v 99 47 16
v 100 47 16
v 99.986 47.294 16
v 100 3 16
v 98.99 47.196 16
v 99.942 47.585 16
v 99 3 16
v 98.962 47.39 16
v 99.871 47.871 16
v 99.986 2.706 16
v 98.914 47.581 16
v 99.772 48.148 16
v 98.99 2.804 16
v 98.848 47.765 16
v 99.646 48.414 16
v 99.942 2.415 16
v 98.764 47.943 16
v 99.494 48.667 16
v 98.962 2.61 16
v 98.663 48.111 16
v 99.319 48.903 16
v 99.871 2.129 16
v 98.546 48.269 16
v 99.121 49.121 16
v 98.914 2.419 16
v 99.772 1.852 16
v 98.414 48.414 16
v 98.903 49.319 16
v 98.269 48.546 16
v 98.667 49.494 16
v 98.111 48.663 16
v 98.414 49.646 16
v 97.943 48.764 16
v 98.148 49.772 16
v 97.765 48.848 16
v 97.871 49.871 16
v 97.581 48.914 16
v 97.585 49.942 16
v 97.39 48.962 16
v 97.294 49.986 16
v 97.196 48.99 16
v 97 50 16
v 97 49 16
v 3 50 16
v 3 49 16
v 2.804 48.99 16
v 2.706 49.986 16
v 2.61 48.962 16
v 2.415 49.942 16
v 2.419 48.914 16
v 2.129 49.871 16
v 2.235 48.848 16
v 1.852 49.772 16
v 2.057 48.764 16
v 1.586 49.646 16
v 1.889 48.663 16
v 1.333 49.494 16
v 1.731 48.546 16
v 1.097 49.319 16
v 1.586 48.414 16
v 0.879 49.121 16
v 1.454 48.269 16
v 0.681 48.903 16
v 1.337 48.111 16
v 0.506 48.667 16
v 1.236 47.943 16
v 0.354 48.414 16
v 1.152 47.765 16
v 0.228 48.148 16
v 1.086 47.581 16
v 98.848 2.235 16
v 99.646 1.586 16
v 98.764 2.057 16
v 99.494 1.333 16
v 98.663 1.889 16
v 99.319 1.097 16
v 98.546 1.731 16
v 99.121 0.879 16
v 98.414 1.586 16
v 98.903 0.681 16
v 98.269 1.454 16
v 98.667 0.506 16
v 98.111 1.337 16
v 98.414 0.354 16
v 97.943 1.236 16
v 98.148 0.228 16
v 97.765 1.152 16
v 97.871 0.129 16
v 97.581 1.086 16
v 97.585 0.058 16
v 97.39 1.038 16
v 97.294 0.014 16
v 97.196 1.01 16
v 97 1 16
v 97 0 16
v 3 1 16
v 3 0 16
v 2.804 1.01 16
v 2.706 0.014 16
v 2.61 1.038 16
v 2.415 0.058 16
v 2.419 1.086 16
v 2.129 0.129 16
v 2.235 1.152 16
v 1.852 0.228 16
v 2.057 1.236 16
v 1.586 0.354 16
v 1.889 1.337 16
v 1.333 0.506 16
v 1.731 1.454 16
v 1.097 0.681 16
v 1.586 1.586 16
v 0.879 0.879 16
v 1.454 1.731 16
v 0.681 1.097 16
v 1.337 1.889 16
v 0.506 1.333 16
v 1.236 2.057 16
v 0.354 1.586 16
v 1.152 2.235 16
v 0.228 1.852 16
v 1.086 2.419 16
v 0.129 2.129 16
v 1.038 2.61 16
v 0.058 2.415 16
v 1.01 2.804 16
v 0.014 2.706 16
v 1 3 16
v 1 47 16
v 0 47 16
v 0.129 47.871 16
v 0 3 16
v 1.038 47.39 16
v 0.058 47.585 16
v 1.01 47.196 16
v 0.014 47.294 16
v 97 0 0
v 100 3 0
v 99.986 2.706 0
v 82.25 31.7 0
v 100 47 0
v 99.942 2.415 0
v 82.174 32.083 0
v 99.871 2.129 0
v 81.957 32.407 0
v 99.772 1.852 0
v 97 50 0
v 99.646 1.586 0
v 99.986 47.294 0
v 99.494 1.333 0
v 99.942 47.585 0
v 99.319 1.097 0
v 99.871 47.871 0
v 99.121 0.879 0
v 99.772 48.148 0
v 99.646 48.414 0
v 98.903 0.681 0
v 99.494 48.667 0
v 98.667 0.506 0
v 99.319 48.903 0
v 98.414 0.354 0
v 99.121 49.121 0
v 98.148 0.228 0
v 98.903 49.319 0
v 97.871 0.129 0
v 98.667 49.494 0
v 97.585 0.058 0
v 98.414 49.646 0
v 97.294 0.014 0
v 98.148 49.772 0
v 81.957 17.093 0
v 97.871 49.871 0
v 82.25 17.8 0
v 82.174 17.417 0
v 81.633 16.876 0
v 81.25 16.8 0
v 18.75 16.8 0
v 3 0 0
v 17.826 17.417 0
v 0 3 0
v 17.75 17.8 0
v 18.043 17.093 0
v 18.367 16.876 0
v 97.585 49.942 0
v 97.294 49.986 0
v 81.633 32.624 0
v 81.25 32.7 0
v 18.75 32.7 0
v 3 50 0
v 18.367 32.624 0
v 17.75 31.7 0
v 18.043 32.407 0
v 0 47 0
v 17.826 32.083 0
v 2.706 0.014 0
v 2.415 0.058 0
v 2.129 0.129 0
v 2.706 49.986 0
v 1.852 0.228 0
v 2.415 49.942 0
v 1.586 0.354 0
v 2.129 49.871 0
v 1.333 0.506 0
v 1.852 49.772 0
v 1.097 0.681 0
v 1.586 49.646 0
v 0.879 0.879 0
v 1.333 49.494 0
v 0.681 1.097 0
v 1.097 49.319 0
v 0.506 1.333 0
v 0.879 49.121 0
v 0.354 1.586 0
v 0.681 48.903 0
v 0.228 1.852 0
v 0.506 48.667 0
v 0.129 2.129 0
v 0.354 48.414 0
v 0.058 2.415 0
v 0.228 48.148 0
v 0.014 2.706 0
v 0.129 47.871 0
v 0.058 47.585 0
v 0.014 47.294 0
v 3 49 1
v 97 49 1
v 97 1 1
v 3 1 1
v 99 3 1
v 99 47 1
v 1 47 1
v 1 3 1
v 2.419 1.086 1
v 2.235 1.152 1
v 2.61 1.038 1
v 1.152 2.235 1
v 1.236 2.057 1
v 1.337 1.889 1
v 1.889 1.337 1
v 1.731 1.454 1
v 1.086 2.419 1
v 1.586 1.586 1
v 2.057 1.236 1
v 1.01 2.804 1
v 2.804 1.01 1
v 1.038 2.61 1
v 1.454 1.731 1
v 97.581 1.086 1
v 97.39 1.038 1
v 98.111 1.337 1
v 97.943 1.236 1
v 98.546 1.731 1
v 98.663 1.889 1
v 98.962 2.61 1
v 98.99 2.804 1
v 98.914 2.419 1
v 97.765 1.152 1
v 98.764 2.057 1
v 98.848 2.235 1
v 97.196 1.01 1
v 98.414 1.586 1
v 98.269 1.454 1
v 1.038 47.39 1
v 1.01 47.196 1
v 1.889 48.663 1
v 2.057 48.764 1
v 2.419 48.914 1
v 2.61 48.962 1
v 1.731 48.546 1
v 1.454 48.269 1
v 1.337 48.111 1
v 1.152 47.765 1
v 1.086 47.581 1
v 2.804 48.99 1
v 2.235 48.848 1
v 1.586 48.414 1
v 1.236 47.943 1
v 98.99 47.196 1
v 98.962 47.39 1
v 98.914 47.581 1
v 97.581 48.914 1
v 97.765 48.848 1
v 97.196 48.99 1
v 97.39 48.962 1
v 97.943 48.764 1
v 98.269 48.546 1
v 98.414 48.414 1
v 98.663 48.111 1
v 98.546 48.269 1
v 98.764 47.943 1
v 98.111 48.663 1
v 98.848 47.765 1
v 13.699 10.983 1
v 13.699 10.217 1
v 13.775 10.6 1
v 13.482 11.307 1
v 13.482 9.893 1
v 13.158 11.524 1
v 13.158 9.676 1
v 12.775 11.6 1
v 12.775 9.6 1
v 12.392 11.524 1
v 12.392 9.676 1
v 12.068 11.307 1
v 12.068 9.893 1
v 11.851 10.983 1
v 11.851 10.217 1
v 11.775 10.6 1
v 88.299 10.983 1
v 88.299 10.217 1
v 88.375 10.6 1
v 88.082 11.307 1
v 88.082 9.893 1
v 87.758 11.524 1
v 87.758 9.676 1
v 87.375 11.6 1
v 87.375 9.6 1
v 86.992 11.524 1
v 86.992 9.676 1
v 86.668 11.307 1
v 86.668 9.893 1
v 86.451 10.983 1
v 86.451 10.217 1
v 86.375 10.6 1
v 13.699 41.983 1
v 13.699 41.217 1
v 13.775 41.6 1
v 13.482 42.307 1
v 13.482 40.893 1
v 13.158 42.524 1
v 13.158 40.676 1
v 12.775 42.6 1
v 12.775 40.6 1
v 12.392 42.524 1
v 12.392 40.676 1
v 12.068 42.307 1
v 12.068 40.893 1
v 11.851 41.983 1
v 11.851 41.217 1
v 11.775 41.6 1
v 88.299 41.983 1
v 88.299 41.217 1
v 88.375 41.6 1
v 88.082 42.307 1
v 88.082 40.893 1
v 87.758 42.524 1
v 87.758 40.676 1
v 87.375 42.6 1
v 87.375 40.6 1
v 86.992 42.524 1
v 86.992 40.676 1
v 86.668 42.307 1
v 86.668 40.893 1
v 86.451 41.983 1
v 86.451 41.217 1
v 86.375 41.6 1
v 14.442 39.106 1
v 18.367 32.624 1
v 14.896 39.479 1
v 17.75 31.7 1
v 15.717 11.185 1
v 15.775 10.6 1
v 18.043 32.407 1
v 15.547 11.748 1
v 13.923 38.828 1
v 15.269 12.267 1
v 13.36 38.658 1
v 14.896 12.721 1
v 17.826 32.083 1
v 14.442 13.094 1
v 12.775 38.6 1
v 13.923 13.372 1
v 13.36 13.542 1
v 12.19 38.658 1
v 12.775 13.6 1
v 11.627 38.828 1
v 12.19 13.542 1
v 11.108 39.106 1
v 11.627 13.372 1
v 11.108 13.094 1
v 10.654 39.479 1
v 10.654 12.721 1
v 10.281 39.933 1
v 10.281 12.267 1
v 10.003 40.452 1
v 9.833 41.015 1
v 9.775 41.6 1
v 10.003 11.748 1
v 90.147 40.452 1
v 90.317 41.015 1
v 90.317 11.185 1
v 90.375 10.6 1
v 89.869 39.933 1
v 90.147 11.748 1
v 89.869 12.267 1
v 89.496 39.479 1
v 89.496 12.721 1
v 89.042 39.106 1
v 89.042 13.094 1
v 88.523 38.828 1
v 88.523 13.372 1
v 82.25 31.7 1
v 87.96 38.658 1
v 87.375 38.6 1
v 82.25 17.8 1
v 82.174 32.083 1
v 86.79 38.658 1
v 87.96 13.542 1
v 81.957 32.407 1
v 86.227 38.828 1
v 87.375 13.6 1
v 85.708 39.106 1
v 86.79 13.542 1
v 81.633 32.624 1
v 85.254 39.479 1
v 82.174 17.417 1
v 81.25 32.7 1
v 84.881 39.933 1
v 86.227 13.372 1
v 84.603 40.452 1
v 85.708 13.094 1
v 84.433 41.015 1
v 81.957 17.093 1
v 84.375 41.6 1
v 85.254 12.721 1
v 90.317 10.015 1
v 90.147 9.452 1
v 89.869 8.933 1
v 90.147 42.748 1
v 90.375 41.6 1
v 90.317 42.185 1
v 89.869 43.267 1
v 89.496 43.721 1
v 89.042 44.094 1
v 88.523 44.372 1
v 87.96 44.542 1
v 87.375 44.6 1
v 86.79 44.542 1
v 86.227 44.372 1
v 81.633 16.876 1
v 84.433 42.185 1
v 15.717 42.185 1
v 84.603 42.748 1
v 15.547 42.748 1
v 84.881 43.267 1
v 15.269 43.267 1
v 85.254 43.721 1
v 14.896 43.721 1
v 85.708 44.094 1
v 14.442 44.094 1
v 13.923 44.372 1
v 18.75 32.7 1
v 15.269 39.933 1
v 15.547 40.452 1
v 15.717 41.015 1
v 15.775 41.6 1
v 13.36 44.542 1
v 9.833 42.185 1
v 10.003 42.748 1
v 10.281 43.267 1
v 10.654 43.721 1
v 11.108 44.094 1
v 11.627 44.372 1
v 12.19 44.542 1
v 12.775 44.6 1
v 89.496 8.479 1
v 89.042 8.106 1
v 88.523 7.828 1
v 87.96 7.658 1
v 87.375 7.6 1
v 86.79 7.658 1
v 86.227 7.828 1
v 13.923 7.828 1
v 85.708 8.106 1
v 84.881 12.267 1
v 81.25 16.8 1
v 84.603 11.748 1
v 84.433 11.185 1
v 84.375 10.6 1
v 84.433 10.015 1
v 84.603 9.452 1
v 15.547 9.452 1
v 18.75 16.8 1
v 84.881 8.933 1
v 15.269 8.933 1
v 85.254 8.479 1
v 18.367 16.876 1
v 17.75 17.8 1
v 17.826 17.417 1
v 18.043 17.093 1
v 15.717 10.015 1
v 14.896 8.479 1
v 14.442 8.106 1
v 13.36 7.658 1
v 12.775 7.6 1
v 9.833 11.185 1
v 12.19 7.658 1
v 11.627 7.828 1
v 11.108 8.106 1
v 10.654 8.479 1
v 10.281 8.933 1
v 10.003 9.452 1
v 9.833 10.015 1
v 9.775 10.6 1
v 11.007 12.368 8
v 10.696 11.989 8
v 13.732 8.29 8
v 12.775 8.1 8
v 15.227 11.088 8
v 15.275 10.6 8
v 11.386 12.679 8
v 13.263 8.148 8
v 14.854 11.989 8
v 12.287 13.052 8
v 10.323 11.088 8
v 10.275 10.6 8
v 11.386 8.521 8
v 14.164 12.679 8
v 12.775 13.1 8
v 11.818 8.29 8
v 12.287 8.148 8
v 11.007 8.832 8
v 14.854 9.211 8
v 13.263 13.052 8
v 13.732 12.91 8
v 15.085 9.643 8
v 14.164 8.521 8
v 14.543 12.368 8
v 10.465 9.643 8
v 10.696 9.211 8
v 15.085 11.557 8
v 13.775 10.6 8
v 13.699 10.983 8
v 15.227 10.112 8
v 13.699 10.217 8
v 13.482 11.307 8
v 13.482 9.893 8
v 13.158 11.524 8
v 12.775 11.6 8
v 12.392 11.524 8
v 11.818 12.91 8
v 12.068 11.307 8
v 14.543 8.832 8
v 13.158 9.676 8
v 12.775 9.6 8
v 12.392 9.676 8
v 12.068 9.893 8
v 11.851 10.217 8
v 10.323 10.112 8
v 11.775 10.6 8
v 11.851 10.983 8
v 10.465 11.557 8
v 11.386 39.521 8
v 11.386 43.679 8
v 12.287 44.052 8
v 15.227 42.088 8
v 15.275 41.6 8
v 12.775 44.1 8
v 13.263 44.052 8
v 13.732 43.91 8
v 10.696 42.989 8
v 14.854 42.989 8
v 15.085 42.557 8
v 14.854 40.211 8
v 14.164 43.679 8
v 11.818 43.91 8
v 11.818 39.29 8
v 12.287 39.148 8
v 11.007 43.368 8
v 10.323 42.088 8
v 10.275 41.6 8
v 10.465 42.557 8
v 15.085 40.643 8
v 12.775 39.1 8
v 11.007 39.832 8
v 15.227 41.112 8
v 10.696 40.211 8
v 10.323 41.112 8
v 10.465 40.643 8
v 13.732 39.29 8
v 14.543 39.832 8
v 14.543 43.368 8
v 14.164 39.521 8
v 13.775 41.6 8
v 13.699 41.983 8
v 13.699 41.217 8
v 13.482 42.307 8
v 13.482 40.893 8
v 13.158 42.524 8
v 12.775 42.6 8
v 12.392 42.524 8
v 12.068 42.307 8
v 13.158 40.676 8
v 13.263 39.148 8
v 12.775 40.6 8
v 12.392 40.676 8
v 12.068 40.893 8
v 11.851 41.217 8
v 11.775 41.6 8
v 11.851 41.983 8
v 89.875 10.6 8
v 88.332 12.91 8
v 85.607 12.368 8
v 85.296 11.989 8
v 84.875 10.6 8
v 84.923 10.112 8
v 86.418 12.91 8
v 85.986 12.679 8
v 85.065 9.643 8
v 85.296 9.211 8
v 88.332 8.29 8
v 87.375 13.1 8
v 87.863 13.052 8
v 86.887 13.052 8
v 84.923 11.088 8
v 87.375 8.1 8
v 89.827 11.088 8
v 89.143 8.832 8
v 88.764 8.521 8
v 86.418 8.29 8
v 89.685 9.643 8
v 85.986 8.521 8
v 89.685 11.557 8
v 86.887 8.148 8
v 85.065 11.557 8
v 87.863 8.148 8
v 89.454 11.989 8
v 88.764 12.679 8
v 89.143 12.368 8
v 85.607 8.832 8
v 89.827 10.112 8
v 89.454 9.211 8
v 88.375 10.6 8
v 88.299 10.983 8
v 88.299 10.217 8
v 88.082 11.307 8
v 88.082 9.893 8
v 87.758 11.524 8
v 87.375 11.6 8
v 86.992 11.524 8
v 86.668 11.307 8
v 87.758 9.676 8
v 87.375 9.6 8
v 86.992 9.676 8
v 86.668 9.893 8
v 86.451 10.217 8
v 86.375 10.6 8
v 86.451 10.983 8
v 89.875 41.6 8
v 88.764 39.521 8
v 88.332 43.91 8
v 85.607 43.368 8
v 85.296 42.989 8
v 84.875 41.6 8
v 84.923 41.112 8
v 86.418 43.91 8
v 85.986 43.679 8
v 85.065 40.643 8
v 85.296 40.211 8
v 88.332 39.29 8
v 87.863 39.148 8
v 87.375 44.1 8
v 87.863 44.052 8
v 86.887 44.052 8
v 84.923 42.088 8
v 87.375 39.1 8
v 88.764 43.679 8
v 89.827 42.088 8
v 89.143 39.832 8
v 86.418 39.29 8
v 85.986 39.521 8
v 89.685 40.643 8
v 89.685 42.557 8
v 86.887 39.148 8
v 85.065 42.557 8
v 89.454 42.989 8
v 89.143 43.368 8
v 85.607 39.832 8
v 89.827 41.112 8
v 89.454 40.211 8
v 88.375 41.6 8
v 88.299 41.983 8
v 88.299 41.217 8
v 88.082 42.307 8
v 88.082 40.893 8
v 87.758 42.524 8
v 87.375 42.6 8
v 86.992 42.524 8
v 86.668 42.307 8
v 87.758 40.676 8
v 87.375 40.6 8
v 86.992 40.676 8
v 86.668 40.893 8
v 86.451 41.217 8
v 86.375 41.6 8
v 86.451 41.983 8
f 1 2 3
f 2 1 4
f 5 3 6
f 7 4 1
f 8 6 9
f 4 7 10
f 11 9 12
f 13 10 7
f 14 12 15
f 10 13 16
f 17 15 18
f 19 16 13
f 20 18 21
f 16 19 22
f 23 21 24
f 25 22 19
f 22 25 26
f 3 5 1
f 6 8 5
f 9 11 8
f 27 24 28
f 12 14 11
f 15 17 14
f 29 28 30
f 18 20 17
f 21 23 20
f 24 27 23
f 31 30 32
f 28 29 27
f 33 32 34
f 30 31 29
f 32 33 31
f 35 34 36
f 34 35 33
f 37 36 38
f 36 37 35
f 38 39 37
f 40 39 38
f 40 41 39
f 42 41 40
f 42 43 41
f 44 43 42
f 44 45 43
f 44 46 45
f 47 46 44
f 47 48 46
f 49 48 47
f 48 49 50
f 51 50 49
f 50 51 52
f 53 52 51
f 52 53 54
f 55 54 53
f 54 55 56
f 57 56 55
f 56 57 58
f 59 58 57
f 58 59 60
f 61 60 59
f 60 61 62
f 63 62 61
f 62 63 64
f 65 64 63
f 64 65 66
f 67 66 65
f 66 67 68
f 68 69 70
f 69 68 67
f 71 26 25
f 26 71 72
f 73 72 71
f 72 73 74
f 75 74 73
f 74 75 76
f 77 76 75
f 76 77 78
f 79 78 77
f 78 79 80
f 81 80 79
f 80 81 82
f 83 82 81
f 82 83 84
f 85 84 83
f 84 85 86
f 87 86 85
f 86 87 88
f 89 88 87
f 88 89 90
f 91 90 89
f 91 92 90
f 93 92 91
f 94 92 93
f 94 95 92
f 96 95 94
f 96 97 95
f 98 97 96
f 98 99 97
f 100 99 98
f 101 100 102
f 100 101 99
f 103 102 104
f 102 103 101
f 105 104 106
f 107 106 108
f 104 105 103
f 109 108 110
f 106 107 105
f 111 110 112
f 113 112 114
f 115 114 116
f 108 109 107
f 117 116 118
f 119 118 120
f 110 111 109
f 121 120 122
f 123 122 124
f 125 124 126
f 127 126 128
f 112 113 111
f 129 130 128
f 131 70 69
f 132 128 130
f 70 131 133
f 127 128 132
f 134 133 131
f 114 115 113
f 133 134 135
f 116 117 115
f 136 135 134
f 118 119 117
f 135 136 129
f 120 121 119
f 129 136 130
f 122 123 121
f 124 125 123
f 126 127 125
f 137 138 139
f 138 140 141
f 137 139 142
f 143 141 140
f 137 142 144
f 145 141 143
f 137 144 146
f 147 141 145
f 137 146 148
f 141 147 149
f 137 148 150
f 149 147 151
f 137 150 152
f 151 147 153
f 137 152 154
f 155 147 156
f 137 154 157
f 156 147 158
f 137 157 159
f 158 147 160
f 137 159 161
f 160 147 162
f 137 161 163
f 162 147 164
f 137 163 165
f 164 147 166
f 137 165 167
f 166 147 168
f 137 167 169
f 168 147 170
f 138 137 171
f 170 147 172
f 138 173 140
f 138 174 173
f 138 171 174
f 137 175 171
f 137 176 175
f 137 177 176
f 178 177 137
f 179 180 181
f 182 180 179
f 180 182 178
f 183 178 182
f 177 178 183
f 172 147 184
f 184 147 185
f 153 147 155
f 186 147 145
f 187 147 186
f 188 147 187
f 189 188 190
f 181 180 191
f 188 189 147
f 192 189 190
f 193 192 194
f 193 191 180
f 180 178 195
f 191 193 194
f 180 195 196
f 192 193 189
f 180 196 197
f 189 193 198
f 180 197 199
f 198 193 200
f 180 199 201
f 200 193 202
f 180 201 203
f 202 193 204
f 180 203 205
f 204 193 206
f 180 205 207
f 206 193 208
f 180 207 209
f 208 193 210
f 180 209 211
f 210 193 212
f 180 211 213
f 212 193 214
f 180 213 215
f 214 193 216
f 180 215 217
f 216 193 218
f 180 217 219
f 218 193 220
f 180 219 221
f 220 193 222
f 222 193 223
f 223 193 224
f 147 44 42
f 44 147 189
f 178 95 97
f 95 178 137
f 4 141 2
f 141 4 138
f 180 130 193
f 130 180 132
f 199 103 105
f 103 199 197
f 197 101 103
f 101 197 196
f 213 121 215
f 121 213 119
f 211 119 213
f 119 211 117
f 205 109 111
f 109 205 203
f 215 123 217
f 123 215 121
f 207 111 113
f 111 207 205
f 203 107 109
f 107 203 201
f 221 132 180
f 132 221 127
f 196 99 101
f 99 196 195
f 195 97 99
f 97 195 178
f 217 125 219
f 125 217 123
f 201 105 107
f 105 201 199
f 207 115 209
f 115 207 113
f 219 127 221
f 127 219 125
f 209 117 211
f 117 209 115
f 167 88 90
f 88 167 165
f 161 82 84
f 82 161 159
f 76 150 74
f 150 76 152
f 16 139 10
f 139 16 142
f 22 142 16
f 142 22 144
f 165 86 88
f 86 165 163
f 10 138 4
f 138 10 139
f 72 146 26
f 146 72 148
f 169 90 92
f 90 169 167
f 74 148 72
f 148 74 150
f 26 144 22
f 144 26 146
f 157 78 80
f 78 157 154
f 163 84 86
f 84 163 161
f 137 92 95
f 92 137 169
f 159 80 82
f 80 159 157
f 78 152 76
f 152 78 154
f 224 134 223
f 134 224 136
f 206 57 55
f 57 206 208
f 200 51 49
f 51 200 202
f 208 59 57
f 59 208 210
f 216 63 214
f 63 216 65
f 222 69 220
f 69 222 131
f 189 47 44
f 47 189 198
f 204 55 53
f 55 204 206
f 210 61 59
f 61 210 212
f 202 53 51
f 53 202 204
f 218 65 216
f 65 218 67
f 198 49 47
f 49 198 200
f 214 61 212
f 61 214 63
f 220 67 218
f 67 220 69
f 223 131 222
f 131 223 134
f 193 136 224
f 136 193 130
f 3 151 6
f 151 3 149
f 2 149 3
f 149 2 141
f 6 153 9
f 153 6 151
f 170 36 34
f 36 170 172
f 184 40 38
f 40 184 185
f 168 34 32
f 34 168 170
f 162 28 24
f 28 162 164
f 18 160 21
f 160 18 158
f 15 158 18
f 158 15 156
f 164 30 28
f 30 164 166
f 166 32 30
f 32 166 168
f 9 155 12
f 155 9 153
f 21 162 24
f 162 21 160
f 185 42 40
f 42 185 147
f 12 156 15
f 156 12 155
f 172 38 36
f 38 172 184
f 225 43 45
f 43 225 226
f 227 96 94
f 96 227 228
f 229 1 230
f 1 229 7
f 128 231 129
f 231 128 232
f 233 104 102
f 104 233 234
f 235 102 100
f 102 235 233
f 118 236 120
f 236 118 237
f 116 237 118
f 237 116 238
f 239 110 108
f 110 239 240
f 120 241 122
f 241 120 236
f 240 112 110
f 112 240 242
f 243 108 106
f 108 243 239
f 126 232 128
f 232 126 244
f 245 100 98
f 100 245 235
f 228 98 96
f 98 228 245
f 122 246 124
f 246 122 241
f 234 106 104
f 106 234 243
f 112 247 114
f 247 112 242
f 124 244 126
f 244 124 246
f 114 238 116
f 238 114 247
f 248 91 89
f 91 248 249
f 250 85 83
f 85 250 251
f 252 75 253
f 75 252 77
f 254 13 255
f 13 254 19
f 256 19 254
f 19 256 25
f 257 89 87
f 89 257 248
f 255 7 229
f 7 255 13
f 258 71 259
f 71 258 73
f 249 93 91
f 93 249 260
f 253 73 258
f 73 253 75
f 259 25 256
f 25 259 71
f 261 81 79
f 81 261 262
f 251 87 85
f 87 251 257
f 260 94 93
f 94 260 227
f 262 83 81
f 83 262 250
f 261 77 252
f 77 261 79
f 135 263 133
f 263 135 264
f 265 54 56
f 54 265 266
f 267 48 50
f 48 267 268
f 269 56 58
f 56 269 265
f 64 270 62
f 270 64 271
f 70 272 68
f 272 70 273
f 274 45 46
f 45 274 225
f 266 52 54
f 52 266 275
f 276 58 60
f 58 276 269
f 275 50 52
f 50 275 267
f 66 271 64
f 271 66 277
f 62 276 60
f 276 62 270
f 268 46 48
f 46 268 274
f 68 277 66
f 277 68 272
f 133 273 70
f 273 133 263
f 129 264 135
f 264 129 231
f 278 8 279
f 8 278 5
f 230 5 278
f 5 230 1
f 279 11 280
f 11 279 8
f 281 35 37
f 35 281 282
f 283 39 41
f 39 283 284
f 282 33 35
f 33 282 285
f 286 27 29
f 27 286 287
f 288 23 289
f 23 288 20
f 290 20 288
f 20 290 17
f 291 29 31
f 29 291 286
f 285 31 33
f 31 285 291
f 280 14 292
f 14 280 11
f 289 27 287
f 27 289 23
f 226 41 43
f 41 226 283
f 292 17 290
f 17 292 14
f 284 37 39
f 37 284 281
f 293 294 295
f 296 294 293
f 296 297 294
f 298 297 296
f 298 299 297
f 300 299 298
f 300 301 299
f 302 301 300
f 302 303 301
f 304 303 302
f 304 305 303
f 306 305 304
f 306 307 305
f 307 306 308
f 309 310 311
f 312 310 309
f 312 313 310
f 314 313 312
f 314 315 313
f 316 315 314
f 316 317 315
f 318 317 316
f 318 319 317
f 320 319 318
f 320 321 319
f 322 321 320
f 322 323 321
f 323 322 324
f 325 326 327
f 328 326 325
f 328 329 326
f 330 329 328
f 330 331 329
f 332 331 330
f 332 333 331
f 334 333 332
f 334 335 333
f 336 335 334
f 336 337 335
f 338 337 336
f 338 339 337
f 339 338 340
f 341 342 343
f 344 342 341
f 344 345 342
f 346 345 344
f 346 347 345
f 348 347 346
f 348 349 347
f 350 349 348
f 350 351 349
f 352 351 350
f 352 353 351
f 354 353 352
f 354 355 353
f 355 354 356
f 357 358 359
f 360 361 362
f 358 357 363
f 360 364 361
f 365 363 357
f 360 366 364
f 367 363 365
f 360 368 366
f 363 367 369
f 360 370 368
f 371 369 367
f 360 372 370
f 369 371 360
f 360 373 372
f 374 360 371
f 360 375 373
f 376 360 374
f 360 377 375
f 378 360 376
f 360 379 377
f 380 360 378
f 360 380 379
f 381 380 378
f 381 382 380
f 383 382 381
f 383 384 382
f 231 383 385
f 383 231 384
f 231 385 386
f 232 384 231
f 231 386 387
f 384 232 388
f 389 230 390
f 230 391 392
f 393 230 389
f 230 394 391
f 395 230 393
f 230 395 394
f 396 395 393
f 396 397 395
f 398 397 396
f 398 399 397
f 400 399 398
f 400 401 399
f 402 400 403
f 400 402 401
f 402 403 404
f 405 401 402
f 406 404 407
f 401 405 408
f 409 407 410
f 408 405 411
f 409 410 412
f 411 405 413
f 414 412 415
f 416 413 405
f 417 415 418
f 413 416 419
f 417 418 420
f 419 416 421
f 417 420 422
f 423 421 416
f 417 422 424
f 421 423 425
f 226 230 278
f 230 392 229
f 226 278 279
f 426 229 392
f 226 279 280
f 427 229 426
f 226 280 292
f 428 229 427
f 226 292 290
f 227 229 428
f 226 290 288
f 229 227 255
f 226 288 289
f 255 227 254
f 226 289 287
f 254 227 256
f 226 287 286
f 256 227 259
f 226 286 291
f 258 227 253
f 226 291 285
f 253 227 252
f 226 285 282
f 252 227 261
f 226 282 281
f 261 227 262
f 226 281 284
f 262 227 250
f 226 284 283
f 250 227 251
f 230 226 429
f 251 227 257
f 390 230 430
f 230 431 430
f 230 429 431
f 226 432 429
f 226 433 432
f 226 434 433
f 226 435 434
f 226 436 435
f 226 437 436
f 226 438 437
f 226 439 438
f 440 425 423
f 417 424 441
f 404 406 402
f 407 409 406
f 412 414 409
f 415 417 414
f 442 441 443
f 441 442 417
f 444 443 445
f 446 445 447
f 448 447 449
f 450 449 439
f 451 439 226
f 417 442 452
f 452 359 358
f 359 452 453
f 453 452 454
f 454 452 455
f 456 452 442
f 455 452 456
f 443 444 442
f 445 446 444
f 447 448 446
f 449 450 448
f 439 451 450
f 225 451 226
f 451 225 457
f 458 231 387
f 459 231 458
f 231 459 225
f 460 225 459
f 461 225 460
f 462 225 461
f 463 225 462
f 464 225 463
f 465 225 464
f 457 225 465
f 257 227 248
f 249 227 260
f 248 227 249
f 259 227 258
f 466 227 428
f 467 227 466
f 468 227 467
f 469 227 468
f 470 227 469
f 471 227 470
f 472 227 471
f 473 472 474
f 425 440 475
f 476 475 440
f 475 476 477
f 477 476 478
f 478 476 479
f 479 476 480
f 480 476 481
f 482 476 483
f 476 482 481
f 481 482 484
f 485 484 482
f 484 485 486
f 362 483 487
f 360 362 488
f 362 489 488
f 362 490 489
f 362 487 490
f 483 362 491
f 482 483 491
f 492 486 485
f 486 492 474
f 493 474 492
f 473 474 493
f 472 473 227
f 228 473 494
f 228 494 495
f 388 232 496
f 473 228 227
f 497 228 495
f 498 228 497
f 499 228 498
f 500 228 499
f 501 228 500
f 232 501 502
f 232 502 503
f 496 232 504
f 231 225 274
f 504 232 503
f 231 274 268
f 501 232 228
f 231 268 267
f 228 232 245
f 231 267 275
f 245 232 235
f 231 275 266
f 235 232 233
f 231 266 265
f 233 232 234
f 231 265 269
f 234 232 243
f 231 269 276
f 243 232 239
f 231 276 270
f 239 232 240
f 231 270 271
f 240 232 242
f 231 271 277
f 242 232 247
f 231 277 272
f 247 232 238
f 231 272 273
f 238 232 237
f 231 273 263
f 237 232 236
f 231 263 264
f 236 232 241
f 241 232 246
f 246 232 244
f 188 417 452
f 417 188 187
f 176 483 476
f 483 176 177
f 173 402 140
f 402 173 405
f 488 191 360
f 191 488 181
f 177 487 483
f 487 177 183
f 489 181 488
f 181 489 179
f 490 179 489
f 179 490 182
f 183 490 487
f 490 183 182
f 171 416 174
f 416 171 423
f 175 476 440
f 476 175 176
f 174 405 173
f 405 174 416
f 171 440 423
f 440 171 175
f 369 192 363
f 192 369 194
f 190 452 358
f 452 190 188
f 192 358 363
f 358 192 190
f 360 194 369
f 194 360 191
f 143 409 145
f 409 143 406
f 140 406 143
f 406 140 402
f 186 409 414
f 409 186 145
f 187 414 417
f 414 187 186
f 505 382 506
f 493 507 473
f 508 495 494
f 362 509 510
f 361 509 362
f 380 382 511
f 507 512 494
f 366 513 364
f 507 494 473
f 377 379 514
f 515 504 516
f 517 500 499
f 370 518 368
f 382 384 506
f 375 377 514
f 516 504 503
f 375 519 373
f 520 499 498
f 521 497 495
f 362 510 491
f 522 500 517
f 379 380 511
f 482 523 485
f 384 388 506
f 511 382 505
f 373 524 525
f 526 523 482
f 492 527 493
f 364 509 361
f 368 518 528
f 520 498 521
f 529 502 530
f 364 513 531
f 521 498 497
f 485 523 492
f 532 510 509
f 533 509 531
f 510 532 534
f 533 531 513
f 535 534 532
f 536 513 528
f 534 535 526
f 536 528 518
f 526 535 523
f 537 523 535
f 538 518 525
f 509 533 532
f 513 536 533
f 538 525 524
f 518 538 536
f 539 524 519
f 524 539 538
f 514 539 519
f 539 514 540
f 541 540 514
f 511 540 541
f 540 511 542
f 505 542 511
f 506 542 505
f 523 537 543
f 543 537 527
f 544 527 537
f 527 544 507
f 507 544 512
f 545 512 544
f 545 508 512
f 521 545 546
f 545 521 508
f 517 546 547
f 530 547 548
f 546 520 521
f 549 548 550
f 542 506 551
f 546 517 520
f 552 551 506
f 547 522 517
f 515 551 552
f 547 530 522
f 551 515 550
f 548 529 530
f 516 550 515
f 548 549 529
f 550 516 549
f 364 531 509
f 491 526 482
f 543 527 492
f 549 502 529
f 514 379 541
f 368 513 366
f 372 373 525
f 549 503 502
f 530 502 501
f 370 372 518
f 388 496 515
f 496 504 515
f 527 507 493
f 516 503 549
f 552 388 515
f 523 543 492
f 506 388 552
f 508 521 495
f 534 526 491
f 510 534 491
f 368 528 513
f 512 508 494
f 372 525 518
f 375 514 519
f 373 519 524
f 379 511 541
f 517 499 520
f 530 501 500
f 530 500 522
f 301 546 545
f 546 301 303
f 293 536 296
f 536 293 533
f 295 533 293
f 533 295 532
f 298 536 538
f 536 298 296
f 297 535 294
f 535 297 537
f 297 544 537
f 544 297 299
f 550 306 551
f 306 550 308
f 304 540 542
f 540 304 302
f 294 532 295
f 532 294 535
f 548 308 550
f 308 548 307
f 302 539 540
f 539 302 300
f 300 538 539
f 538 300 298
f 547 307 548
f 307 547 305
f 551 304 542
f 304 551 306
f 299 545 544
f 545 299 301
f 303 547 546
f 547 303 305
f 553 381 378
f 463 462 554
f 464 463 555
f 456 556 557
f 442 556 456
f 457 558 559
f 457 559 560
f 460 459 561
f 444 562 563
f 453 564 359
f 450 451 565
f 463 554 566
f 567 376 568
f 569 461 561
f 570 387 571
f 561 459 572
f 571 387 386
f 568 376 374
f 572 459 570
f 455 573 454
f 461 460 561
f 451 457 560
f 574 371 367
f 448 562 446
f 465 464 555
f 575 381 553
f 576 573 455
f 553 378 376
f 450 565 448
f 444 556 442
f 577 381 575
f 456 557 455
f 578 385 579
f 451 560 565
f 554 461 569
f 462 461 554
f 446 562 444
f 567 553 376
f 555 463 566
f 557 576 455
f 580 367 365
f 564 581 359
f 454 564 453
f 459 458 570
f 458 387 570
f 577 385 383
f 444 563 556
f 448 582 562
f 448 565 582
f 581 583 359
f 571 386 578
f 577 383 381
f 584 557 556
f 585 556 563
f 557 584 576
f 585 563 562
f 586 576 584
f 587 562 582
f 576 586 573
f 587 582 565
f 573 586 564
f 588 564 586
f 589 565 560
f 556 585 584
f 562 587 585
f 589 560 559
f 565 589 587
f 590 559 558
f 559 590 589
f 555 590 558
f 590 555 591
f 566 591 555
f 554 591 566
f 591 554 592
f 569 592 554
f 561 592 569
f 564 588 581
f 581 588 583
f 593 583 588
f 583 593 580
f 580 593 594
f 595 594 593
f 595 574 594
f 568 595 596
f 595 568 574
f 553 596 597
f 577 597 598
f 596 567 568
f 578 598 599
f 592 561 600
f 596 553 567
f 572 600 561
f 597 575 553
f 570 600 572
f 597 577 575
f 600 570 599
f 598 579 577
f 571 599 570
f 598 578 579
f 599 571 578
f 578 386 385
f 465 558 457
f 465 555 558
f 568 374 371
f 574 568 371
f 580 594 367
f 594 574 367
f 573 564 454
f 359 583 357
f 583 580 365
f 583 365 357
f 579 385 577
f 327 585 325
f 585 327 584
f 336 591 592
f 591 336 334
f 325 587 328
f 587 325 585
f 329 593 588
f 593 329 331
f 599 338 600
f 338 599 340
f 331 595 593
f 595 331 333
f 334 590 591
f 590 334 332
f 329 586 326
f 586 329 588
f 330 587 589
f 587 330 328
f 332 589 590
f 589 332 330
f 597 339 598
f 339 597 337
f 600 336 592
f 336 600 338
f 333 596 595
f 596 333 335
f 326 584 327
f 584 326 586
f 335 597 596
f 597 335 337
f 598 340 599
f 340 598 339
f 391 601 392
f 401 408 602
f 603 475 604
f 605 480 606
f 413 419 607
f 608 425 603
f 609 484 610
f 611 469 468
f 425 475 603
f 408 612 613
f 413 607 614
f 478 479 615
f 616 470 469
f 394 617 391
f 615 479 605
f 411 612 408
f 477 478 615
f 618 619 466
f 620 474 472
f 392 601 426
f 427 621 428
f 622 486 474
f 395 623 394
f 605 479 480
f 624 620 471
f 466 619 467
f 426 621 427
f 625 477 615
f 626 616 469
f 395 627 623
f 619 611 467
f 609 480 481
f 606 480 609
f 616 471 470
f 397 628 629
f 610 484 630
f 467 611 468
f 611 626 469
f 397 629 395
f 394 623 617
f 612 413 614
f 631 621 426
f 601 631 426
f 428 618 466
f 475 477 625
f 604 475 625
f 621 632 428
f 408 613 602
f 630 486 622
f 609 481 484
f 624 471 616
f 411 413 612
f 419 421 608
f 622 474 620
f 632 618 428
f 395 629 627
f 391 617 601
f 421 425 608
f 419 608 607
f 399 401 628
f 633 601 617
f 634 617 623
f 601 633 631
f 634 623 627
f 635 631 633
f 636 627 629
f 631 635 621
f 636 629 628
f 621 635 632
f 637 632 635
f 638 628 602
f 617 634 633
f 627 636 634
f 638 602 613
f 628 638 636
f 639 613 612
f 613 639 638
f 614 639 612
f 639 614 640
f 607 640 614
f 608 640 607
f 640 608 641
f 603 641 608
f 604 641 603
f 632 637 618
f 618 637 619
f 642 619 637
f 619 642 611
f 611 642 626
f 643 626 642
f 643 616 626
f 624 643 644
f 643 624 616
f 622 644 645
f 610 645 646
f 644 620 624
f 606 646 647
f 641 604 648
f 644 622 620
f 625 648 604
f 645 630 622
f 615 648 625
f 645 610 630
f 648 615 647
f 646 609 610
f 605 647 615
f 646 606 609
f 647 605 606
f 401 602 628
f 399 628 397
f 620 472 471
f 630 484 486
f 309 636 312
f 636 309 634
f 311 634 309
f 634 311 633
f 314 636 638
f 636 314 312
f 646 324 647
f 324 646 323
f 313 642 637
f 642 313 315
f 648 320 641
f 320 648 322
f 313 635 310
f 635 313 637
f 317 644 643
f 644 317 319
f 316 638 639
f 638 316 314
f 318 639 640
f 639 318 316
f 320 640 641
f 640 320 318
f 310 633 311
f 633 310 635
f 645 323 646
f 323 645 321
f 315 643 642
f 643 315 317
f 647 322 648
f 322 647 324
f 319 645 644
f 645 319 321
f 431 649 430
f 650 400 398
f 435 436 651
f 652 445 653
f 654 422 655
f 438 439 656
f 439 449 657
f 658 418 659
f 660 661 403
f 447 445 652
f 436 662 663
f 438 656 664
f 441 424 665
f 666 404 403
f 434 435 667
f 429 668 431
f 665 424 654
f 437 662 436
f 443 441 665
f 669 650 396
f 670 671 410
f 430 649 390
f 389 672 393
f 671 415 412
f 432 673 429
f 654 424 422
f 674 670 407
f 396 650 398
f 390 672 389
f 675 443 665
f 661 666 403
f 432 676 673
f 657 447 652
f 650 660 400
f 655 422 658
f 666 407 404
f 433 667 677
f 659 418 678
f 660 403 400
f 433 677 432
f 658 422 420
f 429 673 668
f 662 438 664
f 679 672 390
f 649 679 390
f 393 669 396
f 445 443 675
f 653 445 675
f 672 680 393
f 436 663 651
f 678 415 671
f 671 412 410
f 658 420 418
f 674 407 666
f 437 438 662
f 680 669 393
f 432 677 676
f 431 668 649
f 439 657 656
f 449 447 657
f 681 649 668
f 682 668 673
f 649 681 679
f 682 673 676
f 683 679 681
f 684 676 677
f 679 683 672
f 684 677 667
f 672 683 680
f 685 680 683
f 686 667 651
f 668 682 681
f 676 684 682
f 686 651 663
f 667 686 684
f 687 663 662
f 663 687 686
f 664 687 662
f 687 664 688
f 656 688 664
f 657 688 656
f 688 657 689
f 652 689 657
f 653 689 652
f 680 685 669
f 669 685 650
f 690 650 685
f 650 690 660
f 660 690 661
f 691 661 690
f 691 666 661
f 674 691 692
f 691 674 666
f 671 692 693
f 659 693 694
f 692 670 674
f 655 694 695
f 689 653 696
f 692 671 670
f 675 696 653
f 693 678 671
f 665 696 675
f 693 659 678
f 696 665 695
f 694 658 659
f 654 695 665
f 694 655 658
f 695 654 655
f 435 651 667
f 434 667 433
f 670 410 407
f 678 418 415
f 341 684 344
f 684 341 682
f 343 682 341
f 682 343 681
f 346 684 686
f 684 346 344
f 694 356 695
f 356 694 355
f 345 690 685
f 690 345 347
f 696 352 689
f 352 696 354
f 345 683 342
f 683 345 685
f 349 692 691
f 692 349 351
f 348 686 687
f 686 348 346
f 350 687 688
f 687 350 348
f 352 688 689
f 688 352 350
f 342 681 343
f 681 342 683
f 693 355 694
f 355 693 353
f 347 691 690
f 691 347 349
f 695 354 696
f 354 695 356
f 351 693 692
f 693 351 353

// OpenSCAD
//base plate
size_x=100;
size_y=50;
size_z=1;
corner_radius=3;
corner_faces=64;

//cutout
cutout_corner_radius=1;
cutout_corner_faces=16;
offset_x=10;
offset_y=8;

//rim
rim_height=16;

module plate (sizeX, sizeY, sizeZ, cornerRadius, cornerFaces)
{
    translate([cornerRadius, 0, 0])
        cube([sizeX - 2 * cornerRadius, sizeY, sizeZ]);		
    translate([0, cornerRadius, 0])
        cube([sizeX, sizeY - 2 * cornerRadius, sizeZ]);		
    translate([cornerRadius,cornerRadius,0])
        cylinder(r=cornerRadius,h=sizeZ, $fn=cornerFaces);
    translate([sizeX-cornerRadius,cornerRadius,0])
        cylinder(r=cornerRadius,h=sizeZ, $fn=cornerFaces);
    translate([cornerRadius,sizeY-cornerRadius,0])
        cylinder(r=cornerRadius,h=sizeZ, $fn=cornerFaces);
    translate([sizeX-cornerRadius,sizeY-cornerRadius,0])
        cylinder(r=cornerRadius,h=sizeZ, $fn=cornerFaces);
}

module posts()
{

	union()
	{
		difference()
		{
			translate([0+2.775,0+2.6,size_z]) cylinder(r1=6/2, r2=5/2,h=7, $fn=32);	
			translate([0+2.775,0+2.6,size_z]) cylinder(r=1,h=7.5, $fn=16);
		}
		difference()
		{
			translate([0+2.775,31+2.6,size_z]) cylinder(r1=6/2, r2=5/2,h=7, $fn=32);
			translate([0+2.775,31+2.6,size_z]) cylinder(r=1,h=7.5, $fn=16);
		}

		difference()
		{
			translate([74.60+2.775,0+2.6,size_z]) cylinder(r1=6/2, r2=5/2,h=7, $fn=32);
			translate([74.60+2.775,0+2.6,size_z]) cylinder(r=1,h=7.5, $fn=16);
		}	

		difference()
		{
			translate([74.60+2.775,31+2.6,size_z]) cylinder(r1=6/2, r2=5/2,h=7, $fn=32);
			translate([74.60+2.775,31+2.6,size_z]) cylinder(r=1,h=7.5, $fn=16);
		}
	}
}


difference()
{
    plate (size_x, size_y,rim_height, corner_radius, corner_faces);
    translate([size_z,size_z,-size_z])
        plate (size_x-(2*size_z), size_y-(2*size_z),rim_height + size_z * 2, corner_radius-size_z, corner_faces);
}

union()
{
    difference()
    {
        //base plate
        plate (size_x, size_y, size_z, corner_radius, corner_faces);
        //display cutout
        translate([7.75+offset_x,8.8+offset_y,-size_z * 5])
            plate(64.5,15.9,10,cutout_corner_radius,cutout_corner_faces);

    }
    translate([offset_x,offset_y,0])
        posts();
}
